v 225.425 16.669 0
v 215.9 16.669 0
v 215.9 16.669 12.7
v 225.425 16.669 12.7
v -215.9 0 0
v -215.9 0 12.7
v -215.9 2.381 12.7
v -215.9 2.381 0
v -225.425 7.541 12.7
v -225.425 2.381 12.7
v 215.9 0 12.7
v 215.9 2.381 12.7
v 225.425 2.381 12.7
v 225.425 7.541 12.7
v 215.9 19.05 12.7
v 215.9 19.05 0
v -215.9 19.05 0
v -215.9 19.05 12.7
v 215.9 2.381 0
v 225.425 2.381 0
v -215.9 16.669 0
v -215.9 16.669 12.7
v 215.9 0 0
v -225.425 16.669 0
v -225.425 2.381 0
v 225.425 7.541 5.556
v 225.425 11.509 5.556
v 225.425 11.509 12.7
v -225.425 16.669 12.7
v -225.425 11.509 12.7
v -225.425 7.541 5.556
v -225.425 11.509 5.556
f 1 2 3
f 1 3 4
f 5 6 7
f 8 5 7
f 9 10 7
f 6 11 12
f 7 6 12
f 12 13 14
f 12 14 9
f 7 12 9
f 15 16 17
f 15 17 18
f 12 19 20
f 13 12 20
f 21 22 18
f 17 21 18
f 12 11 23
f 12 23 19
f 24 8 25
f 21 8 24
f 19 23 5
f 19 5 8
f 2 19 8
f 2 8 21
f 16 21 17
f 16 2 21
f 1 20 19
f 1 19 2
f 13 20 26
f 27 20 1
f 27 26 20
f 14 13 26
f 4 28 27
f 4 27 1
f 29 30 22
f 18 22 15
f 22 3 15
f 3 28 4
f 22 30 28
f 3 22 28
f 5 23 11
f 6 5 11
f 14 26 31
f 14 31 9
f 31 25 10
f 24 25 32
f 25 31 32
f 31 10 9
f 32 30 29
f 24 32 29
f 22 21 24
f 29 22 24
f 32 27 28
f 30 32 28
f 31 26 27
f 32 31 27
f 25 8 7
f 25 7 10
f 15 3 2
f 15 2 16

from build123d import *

# Parameters (mm, degrees)
F0_W     = 19.05
F0_H     = 12.7
F1_DEPTH = 225.425
F2_W     = 3.96875
F2_H     = 7.14375
F3_DEPTH = 450.85
F4_W     = 9.525
F4_H     = 2.38125
F5_DEPTH = 12.7


# Not quite as in the source:
# - a pattern or mirror of a feature is missing from the dataset's text; its kind, count and spacing are read off the source's solid


with BuildPart() as f1:
    # F0 (on Right) → F1 (new body, symmetric)
    with BuildSketch(Plane.YZ):
        with Locations((9.525, 6.35)):
            Rectangle(F0_W, F0_H)
    extrude(amount=F1_DEPTH, both=True)

    # F2 (on face) → F3 (cut, through all)
    with BuildSketch(Plane.YZ.offset(225.425)):
        with Locations((9.525, 9.128125)):
            Rectangle(F2_W, F2_H)
    extrude(amount=-F3_DEPTH, mode=Mode.SUBTRACT)

    # F4 (on face) → F5 (cut, through all)
    with BuildSketch(Plane.XY.offset(12.7)):
        with Locations((220.6625, 17.859375)):
            Rectangle(F4_W, F4_H)
        with Locations((220.6625, 1.190625)):
            Rectangle(F4_W, F4_H)
    f5 = extrude(amount=-F5_DEPTH, mode=Mode.SUBTRACT)

    # F5_copies: F5 across plane
    add(f5.mirror(Plane(origin=(0, 0, 0), x_dir=(0, 0, -1), z_dir=(-1, 0, 0))), mode=Mode.SUBTRACT)


solid = f1.part
